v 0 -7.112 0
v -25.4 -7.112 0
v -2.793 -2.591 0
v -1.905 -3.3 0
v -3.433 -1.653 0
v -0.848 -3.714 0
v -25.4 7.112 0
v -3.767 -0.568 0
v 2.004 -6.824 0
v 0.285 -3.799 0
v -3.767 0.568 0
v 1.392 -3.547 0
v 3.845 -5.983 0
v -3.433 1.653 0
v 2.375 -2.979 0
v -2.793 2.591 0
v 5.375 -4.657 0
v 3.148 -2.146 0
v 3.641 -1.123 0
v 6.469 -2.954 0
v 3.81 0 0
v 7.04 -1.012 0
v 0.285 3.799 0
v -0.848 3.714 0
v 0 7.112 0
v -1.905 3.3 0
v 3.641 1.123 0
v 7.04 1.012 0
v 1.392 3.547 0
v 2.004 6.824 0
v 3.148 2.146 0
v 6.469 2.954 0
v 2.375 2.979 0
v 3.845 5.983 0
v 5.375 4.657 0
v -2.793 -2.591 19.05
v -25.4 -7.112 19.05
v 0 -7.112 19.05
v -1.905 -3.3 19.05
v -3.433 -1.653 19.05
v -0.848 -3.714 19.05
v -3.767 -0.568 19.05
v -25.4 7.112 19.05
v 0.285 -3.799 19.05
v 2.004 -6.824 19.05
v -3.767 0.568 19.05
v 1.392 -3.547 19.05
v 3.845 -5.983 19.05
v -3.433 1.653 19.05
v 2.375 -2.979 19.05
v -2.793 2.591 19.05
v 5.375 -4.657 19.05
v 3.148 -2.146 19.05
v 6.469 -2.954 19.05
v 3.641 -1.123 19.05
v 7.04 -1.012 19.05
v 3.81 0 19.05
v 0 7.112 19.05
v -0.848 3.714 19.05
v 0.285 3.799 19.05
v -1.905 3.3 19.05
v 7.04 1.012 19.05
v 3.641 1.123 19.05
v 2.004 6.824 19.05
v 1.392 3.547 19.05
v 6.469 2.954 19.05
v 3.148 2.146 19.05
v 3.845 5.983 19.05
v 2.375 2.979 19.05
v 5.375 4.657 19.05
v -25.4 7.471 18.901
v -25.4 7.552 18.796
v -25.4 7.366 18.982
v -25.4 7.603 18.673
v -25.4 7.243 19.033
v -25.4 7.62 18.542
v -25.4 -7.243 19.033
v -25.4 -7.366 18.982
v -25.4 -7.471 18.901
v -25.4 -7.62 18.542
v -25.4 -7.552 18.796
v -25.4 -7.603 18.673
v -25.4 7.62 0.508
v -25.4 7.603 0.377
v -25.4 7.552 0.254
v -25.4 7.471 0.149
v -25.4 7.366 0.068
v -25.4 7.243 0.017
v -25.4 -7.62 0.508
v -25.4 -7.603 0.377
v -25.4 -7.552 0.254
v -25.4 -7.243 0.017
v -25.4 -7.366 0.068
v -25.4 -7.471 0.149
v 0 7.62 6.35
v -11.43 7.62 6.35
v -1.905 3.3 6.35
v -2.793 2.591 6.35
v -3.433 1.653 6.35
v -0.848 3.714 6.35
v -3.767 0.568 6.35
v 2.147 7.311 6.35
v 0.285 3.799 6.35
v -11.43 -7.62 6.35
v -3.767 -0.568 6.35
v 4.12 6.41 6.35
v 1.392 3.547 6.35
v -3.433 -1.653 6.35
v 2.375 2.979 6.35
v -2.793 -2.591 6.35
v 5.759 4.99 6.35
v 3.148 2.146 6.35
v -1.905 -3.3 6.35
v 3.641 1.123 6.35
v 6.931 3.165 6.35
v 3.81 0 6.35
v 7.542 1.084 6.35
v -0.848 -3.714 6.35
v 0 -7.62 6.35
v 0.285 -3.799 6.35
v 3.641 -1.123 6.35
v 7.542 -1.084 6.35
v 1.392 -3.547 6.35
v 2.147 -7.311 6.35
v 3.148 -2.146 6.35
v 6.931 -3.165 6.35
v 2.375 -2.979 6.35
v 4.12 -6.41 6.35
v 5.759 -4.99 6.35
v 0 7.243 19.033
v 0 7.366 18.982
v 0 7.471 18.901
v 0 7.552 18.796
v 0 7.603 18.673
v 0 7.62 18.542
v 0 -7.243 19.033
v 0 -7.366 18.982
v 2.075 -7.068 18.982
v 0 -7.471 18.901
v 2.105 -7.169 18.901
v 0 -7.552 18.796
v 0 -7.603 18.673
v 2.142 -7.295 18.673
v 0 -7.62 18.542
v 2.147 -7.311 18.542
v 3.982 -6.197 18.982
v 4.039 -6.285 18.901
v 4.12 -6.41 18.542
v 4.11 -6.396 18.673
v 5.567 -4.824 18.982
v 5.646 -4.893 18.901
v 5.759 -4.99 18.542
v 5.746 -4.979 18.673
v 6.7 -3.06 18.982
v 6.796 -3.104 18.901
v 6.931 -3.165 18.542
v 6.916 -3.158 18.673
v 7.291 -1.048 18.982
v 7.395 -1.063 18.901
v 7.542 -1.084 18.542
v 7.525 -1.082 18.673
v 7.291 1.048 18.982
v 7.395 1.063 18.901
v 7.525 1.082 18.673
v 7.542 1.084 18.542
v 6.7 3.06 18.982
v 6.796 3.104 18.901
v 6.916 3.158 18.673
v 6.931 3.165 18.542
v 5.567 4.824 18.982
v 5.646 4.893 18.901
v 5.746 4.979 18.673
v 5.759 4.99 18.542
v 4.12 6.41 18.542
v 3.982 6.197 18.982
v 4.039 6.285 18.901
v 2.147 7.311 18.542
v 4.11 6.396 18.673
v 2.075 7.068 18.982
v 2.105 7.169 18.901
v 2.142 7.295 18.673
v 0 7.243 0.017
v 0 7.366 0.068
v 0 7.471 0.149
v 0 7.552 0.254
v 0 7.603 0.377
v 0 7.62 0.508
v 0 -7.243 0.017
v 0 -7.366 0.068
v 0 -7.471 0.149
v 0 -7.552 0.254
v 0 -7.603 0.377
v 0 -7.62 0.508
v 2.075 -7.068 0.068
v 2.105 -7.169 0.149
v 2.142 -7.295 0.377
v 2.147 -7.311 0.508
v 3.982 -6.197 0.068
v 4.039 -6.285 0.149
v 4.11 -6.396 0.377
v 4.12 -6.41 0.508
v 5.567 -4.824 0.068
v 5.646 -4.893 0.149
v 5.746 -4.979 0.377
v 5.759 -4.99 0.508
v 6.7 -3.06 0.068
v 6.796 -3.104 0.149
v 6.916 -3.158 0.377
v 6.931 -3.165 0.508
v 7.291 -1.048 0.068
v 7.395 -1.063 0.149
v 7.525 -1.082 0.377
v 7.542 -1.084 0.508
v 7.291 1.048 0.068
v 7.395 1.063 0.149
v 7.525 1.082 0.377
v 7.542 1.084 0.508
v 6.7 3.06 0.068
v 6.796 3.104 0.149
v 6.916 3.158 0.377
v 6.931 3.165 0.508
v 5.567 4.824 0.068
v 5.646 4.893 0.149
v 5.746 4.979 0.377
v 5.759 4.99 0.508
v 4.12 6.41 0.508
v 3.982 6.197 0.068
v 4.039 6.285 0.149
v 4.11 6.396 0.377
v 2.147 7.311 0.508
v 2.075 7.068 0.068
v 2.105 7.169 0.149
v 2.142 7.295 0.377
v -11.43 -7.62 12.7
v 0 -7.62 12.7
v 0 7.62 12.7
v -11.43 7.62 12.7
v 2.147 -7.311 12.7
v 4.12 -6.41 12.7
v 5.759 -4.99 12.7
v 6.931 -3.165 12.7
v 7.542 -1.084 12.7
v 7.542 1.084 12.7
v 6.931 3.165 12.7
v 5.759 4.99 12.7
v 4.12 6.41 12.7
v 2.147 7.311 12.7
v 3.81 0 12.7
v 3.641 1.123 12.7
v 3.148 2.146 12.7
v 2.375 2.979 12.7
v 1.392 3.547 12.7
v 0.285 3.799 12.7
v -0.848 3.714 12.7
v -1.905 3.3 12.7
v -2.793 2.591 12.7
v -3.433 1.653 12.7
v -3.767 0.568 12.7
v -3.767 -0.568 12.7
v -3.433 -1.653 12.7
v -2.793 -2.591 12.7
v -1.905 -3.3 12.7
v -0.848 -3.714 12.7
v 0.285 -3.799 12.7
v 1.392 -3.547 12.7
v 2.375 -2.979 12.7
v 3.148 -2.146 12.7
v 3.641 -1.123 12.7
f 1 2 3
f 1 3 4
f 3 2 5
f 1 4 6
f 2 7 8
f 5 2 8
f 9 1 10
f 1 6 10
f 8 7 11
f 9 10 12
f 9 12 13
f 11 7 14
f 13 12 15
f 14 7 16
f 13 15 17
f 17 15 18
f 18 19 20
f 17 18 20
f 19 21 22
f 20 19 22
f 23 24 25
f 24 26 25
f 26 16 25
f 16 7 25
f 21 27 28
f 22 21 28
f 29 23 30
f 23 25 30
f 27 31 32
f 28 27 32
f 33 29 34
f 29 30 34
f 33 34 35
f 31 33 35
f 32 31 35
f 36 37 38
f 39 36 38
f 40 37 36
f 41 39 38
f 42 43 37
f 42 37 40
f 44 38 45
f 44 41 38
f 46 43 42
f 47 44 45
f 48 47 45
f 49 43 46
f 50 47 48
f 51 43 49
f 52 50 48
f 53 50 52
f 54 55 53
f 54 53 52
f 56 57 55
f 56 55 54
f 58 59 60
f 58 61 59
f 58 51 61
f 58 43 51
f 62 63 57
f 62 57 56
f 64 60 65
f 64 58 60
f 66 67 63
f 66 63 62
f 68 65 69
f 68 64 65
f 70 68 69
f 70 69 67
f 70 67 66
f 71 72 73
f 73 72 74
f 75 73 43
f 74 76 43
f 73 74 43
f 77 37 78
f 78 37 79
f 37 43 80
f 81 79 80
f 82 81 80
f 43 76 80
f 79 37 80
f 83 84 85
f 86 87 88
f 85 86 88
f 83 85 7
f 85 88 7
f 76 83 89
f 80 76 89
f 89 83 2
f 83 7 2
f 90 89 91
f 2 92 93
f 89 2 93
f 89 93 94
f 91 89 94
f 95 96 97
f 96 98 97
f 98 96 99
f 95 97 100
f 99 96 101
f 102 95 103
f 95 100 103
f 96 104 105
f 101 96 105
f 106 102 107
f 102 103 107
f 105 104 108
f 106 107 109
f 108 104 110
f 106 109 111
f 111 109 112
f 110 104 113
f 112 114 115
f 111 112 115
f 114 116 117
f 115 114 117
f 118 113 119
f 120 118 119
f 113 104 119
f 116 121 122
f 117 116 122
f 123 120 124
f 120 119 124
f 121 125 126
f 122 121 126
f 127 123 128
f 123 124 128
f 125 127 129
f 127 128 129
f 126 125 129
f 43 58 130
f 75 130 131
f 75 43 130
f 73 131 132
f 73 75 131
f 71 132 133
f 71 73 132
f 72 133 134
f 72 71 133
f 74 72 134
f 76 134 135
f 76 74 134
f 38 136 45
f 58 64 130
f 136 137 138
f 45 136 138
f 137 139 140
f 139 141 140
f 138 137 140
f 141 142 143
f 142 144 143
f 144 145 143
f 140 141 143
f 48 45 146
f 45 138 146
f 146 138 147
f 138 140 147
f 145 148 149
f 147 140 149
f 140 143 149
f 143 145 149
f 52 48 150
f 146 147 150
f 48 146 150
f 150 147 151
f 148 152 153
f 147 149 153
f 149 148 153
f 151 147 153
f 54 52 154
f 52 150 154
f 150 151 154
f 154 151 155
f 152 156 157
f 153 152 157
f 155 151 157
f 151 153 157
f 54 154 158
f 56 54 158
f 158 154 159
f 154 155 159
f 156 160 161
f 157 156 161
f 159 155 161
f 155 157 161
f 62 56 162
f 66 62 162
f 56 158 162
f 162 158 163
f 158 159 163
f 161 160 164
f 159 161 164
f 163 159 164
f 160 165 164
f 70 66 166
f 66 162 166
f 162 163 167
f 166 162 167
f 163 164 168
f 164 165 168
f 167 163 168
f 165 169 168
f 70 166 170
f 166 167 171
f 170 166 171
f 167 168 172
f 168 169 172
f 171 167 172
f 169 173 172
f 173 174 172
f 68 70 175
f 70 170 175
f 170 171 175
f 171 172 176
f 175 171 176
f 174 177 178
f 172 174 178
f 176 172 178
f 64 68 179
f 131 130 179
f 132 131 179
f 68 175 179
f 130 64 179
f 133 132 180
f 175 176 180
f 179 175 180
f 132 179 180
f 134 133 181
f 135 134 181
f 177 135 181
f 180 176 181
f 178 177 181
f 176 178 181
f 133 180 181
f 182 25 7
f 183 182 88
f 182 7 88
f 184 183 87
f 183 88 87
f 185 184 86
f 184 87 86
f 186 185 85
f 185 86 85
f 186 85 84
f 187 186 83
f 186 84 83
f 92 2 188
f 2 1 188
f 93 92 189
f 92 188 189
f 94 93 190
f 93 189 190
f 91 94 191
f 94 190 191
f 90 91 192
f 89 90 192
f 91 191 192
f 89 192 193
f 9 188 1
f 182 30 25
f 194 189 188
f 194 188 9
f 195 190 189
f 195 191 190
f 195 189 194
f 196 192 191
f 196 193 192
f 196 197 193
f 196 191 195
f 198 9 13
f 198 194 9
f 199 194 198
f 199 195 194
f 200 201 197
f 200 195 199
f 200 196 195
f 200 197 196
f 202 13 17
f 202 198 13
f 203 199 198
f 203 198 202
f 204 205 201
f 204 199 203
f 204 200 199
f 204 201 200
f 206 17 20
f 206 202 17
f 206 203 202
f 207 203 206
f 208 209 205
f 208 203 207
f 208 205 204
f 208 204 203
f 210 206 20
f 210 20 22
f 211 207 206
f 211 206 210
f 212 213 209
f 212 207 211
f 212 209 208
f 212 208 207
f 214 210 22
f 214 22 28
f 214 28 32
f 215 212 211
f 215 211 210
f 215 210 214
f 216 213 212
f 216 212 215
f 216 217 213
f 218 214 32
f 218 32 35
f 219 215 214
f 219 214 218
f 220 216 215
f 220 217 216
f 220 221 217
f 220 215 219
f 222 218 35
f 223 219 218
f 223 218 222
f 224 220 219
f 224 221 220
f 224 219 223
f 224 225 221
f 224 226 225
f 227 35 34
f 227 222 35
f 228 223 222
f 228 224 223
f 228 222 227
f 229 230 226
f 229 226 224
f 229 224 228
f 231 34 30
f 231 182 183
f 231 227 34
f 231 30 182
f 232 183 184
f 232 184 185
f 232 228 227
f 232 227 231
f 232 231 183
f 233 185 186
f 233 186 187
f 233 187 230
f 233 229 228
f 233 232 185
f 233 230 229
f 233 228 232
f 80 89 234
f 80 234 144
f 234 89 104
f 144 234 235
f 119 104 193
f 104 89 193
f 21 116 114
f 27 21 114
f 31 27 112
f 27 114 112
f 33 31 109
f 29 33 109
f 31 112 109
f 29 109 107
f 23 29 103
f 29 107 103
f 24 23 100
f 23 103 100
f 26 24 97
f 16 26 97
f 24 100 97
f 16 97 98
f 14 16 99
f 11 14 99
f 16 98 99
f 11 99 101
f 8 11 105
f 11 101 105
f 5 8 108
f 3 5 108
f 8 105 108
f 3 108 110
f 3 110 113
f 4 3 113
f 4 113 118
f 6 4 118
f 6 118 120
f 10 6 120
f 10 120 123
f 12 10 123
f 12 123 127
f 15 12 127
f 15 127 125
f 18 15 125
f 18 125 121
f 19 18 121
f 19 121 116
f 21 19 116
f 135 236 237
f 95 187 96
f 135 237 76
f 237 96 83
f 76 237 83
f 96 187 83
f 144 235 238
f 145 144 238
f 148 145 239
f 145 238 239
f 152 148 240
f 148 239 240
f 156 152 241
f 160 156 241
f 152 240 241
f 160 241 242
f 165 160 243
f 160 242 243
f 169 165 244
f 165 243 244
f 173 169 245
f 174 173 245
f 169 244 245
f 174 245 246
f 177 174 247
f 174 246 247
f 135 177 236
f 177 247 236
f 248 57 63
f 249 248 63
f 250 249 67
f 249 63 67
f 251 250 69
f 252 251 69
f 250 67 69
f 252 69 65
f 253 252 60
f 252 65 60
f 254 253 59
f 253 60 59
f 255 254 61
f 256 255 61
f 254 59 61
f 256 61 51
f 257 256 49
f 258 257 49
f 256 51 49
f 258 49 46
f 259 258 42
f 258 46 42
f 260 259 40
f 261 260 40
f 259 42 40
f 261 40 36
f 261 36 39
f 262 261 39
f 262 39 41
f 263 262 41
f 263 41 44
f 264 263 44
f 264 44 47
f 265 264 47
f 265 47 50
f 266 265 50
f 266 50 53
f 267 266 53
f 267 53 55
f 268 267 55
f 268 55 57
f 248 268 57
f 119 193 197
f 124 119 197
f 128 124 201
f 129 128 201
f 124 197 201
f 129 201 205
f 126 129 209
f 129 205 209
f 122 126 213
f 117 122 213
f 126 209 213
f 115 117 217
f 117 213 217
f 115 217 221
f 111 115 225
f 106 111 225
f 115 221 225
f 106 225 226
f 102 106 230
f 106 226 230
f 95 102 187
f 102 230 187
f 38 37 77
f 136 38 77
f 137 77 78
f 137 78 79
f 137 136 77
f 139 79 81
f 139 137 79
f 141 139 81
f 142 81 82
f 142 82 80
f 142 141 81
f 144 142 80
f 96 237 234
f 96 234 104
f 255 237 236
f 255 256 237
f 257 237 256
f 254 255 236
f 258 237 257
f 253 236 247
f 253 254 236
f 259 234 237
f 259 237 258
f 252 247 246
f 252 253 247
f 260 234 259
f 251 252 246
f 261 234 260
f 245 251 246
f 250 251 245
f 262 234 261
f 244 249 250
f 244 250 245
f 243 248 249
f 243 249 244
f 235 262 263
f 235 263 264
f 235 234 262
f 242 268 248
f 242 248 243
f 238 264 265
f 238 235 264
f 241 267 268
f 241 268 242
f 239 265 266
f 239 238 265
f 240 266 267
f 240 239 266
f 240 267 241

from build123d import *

# Parameters (mm, degrees)
BOSS_EXTRUDE1_DEPTH     = 19.05
SKETCH2_W               = 19.05
SKETCH2_H               = 6.35
CUT_EXTRUDE1_DEPTH      = 8.62
CUT_EXTRUDE1_DEPTH_BACK = 8.62
SKETCH3_R               = 3.81
CUT_EXTRUDE2_DEPTH      = 20.05
FILLET1_R               = 0.508


with BuildPart() as part:
    # Sketch1 → Boss-Extrude1 (new body)
    with BuildSketch(Plane.XY):
        with BuildLine():
            Line((0, 7.62), (-25.4, 7.62))
            Line((-25.4, 7.62), (-25.4, -7.62))
            Line((-25.4, -7.62), (0, -7.62))
            ThreePointArc((0, -7.62), (7.62, 0), (0, 7.62))
        make_face()
    extrude(amount=BOSS_EXTRUDE1_DEPTH)

    # Sketch2 → Cut-Extrude1 (cut, two sides)
    with BuildSketch(Plane(origin=(0, 0, 0), x_dir=(1, 0, 0), z_dir=(0, 1, 0))) as cut_extrude1_sk:
        with Locations((-1.905, -9.525)):
            Rectangle(SKETCH2_W, SKETCH2_H)
    extrude(amount=CUT_EXTRUDE1_DEPTH, mode=Mode.SUBTRACT)
    extrude(cut_extrude1_sk.sketch, amount=-CUT_EXTRUDE1_DEPTH_BACK, mode=Mode.SUBTRACT)

    # Sketch3 → Cut-Extrude2 (cut, through all)
    with BuildSketch(Plane.XY.offset(19.05)):
        Circle(SKETCH3_R)
    extrude(amount=-CUT_EXTRUDE2_DEPTH, mode=Mode.SUBTRACT)

    # Fillet1
    fillet1_edges = [part.edges().sort_by_distance(p)[0] for p in [
        (-12.7, -7.62, 19.05),
        (7.62, 0, 19.05),
        (-12.7, -7.62, 0),
        (-12.7, 7.62, 0),
        (7.62, 0, 0),
        (-12.7, 7.62, 19.05),
    ]]
    fillet(fillet1_edges, radius=FILLET1_R)


solid = part.part
